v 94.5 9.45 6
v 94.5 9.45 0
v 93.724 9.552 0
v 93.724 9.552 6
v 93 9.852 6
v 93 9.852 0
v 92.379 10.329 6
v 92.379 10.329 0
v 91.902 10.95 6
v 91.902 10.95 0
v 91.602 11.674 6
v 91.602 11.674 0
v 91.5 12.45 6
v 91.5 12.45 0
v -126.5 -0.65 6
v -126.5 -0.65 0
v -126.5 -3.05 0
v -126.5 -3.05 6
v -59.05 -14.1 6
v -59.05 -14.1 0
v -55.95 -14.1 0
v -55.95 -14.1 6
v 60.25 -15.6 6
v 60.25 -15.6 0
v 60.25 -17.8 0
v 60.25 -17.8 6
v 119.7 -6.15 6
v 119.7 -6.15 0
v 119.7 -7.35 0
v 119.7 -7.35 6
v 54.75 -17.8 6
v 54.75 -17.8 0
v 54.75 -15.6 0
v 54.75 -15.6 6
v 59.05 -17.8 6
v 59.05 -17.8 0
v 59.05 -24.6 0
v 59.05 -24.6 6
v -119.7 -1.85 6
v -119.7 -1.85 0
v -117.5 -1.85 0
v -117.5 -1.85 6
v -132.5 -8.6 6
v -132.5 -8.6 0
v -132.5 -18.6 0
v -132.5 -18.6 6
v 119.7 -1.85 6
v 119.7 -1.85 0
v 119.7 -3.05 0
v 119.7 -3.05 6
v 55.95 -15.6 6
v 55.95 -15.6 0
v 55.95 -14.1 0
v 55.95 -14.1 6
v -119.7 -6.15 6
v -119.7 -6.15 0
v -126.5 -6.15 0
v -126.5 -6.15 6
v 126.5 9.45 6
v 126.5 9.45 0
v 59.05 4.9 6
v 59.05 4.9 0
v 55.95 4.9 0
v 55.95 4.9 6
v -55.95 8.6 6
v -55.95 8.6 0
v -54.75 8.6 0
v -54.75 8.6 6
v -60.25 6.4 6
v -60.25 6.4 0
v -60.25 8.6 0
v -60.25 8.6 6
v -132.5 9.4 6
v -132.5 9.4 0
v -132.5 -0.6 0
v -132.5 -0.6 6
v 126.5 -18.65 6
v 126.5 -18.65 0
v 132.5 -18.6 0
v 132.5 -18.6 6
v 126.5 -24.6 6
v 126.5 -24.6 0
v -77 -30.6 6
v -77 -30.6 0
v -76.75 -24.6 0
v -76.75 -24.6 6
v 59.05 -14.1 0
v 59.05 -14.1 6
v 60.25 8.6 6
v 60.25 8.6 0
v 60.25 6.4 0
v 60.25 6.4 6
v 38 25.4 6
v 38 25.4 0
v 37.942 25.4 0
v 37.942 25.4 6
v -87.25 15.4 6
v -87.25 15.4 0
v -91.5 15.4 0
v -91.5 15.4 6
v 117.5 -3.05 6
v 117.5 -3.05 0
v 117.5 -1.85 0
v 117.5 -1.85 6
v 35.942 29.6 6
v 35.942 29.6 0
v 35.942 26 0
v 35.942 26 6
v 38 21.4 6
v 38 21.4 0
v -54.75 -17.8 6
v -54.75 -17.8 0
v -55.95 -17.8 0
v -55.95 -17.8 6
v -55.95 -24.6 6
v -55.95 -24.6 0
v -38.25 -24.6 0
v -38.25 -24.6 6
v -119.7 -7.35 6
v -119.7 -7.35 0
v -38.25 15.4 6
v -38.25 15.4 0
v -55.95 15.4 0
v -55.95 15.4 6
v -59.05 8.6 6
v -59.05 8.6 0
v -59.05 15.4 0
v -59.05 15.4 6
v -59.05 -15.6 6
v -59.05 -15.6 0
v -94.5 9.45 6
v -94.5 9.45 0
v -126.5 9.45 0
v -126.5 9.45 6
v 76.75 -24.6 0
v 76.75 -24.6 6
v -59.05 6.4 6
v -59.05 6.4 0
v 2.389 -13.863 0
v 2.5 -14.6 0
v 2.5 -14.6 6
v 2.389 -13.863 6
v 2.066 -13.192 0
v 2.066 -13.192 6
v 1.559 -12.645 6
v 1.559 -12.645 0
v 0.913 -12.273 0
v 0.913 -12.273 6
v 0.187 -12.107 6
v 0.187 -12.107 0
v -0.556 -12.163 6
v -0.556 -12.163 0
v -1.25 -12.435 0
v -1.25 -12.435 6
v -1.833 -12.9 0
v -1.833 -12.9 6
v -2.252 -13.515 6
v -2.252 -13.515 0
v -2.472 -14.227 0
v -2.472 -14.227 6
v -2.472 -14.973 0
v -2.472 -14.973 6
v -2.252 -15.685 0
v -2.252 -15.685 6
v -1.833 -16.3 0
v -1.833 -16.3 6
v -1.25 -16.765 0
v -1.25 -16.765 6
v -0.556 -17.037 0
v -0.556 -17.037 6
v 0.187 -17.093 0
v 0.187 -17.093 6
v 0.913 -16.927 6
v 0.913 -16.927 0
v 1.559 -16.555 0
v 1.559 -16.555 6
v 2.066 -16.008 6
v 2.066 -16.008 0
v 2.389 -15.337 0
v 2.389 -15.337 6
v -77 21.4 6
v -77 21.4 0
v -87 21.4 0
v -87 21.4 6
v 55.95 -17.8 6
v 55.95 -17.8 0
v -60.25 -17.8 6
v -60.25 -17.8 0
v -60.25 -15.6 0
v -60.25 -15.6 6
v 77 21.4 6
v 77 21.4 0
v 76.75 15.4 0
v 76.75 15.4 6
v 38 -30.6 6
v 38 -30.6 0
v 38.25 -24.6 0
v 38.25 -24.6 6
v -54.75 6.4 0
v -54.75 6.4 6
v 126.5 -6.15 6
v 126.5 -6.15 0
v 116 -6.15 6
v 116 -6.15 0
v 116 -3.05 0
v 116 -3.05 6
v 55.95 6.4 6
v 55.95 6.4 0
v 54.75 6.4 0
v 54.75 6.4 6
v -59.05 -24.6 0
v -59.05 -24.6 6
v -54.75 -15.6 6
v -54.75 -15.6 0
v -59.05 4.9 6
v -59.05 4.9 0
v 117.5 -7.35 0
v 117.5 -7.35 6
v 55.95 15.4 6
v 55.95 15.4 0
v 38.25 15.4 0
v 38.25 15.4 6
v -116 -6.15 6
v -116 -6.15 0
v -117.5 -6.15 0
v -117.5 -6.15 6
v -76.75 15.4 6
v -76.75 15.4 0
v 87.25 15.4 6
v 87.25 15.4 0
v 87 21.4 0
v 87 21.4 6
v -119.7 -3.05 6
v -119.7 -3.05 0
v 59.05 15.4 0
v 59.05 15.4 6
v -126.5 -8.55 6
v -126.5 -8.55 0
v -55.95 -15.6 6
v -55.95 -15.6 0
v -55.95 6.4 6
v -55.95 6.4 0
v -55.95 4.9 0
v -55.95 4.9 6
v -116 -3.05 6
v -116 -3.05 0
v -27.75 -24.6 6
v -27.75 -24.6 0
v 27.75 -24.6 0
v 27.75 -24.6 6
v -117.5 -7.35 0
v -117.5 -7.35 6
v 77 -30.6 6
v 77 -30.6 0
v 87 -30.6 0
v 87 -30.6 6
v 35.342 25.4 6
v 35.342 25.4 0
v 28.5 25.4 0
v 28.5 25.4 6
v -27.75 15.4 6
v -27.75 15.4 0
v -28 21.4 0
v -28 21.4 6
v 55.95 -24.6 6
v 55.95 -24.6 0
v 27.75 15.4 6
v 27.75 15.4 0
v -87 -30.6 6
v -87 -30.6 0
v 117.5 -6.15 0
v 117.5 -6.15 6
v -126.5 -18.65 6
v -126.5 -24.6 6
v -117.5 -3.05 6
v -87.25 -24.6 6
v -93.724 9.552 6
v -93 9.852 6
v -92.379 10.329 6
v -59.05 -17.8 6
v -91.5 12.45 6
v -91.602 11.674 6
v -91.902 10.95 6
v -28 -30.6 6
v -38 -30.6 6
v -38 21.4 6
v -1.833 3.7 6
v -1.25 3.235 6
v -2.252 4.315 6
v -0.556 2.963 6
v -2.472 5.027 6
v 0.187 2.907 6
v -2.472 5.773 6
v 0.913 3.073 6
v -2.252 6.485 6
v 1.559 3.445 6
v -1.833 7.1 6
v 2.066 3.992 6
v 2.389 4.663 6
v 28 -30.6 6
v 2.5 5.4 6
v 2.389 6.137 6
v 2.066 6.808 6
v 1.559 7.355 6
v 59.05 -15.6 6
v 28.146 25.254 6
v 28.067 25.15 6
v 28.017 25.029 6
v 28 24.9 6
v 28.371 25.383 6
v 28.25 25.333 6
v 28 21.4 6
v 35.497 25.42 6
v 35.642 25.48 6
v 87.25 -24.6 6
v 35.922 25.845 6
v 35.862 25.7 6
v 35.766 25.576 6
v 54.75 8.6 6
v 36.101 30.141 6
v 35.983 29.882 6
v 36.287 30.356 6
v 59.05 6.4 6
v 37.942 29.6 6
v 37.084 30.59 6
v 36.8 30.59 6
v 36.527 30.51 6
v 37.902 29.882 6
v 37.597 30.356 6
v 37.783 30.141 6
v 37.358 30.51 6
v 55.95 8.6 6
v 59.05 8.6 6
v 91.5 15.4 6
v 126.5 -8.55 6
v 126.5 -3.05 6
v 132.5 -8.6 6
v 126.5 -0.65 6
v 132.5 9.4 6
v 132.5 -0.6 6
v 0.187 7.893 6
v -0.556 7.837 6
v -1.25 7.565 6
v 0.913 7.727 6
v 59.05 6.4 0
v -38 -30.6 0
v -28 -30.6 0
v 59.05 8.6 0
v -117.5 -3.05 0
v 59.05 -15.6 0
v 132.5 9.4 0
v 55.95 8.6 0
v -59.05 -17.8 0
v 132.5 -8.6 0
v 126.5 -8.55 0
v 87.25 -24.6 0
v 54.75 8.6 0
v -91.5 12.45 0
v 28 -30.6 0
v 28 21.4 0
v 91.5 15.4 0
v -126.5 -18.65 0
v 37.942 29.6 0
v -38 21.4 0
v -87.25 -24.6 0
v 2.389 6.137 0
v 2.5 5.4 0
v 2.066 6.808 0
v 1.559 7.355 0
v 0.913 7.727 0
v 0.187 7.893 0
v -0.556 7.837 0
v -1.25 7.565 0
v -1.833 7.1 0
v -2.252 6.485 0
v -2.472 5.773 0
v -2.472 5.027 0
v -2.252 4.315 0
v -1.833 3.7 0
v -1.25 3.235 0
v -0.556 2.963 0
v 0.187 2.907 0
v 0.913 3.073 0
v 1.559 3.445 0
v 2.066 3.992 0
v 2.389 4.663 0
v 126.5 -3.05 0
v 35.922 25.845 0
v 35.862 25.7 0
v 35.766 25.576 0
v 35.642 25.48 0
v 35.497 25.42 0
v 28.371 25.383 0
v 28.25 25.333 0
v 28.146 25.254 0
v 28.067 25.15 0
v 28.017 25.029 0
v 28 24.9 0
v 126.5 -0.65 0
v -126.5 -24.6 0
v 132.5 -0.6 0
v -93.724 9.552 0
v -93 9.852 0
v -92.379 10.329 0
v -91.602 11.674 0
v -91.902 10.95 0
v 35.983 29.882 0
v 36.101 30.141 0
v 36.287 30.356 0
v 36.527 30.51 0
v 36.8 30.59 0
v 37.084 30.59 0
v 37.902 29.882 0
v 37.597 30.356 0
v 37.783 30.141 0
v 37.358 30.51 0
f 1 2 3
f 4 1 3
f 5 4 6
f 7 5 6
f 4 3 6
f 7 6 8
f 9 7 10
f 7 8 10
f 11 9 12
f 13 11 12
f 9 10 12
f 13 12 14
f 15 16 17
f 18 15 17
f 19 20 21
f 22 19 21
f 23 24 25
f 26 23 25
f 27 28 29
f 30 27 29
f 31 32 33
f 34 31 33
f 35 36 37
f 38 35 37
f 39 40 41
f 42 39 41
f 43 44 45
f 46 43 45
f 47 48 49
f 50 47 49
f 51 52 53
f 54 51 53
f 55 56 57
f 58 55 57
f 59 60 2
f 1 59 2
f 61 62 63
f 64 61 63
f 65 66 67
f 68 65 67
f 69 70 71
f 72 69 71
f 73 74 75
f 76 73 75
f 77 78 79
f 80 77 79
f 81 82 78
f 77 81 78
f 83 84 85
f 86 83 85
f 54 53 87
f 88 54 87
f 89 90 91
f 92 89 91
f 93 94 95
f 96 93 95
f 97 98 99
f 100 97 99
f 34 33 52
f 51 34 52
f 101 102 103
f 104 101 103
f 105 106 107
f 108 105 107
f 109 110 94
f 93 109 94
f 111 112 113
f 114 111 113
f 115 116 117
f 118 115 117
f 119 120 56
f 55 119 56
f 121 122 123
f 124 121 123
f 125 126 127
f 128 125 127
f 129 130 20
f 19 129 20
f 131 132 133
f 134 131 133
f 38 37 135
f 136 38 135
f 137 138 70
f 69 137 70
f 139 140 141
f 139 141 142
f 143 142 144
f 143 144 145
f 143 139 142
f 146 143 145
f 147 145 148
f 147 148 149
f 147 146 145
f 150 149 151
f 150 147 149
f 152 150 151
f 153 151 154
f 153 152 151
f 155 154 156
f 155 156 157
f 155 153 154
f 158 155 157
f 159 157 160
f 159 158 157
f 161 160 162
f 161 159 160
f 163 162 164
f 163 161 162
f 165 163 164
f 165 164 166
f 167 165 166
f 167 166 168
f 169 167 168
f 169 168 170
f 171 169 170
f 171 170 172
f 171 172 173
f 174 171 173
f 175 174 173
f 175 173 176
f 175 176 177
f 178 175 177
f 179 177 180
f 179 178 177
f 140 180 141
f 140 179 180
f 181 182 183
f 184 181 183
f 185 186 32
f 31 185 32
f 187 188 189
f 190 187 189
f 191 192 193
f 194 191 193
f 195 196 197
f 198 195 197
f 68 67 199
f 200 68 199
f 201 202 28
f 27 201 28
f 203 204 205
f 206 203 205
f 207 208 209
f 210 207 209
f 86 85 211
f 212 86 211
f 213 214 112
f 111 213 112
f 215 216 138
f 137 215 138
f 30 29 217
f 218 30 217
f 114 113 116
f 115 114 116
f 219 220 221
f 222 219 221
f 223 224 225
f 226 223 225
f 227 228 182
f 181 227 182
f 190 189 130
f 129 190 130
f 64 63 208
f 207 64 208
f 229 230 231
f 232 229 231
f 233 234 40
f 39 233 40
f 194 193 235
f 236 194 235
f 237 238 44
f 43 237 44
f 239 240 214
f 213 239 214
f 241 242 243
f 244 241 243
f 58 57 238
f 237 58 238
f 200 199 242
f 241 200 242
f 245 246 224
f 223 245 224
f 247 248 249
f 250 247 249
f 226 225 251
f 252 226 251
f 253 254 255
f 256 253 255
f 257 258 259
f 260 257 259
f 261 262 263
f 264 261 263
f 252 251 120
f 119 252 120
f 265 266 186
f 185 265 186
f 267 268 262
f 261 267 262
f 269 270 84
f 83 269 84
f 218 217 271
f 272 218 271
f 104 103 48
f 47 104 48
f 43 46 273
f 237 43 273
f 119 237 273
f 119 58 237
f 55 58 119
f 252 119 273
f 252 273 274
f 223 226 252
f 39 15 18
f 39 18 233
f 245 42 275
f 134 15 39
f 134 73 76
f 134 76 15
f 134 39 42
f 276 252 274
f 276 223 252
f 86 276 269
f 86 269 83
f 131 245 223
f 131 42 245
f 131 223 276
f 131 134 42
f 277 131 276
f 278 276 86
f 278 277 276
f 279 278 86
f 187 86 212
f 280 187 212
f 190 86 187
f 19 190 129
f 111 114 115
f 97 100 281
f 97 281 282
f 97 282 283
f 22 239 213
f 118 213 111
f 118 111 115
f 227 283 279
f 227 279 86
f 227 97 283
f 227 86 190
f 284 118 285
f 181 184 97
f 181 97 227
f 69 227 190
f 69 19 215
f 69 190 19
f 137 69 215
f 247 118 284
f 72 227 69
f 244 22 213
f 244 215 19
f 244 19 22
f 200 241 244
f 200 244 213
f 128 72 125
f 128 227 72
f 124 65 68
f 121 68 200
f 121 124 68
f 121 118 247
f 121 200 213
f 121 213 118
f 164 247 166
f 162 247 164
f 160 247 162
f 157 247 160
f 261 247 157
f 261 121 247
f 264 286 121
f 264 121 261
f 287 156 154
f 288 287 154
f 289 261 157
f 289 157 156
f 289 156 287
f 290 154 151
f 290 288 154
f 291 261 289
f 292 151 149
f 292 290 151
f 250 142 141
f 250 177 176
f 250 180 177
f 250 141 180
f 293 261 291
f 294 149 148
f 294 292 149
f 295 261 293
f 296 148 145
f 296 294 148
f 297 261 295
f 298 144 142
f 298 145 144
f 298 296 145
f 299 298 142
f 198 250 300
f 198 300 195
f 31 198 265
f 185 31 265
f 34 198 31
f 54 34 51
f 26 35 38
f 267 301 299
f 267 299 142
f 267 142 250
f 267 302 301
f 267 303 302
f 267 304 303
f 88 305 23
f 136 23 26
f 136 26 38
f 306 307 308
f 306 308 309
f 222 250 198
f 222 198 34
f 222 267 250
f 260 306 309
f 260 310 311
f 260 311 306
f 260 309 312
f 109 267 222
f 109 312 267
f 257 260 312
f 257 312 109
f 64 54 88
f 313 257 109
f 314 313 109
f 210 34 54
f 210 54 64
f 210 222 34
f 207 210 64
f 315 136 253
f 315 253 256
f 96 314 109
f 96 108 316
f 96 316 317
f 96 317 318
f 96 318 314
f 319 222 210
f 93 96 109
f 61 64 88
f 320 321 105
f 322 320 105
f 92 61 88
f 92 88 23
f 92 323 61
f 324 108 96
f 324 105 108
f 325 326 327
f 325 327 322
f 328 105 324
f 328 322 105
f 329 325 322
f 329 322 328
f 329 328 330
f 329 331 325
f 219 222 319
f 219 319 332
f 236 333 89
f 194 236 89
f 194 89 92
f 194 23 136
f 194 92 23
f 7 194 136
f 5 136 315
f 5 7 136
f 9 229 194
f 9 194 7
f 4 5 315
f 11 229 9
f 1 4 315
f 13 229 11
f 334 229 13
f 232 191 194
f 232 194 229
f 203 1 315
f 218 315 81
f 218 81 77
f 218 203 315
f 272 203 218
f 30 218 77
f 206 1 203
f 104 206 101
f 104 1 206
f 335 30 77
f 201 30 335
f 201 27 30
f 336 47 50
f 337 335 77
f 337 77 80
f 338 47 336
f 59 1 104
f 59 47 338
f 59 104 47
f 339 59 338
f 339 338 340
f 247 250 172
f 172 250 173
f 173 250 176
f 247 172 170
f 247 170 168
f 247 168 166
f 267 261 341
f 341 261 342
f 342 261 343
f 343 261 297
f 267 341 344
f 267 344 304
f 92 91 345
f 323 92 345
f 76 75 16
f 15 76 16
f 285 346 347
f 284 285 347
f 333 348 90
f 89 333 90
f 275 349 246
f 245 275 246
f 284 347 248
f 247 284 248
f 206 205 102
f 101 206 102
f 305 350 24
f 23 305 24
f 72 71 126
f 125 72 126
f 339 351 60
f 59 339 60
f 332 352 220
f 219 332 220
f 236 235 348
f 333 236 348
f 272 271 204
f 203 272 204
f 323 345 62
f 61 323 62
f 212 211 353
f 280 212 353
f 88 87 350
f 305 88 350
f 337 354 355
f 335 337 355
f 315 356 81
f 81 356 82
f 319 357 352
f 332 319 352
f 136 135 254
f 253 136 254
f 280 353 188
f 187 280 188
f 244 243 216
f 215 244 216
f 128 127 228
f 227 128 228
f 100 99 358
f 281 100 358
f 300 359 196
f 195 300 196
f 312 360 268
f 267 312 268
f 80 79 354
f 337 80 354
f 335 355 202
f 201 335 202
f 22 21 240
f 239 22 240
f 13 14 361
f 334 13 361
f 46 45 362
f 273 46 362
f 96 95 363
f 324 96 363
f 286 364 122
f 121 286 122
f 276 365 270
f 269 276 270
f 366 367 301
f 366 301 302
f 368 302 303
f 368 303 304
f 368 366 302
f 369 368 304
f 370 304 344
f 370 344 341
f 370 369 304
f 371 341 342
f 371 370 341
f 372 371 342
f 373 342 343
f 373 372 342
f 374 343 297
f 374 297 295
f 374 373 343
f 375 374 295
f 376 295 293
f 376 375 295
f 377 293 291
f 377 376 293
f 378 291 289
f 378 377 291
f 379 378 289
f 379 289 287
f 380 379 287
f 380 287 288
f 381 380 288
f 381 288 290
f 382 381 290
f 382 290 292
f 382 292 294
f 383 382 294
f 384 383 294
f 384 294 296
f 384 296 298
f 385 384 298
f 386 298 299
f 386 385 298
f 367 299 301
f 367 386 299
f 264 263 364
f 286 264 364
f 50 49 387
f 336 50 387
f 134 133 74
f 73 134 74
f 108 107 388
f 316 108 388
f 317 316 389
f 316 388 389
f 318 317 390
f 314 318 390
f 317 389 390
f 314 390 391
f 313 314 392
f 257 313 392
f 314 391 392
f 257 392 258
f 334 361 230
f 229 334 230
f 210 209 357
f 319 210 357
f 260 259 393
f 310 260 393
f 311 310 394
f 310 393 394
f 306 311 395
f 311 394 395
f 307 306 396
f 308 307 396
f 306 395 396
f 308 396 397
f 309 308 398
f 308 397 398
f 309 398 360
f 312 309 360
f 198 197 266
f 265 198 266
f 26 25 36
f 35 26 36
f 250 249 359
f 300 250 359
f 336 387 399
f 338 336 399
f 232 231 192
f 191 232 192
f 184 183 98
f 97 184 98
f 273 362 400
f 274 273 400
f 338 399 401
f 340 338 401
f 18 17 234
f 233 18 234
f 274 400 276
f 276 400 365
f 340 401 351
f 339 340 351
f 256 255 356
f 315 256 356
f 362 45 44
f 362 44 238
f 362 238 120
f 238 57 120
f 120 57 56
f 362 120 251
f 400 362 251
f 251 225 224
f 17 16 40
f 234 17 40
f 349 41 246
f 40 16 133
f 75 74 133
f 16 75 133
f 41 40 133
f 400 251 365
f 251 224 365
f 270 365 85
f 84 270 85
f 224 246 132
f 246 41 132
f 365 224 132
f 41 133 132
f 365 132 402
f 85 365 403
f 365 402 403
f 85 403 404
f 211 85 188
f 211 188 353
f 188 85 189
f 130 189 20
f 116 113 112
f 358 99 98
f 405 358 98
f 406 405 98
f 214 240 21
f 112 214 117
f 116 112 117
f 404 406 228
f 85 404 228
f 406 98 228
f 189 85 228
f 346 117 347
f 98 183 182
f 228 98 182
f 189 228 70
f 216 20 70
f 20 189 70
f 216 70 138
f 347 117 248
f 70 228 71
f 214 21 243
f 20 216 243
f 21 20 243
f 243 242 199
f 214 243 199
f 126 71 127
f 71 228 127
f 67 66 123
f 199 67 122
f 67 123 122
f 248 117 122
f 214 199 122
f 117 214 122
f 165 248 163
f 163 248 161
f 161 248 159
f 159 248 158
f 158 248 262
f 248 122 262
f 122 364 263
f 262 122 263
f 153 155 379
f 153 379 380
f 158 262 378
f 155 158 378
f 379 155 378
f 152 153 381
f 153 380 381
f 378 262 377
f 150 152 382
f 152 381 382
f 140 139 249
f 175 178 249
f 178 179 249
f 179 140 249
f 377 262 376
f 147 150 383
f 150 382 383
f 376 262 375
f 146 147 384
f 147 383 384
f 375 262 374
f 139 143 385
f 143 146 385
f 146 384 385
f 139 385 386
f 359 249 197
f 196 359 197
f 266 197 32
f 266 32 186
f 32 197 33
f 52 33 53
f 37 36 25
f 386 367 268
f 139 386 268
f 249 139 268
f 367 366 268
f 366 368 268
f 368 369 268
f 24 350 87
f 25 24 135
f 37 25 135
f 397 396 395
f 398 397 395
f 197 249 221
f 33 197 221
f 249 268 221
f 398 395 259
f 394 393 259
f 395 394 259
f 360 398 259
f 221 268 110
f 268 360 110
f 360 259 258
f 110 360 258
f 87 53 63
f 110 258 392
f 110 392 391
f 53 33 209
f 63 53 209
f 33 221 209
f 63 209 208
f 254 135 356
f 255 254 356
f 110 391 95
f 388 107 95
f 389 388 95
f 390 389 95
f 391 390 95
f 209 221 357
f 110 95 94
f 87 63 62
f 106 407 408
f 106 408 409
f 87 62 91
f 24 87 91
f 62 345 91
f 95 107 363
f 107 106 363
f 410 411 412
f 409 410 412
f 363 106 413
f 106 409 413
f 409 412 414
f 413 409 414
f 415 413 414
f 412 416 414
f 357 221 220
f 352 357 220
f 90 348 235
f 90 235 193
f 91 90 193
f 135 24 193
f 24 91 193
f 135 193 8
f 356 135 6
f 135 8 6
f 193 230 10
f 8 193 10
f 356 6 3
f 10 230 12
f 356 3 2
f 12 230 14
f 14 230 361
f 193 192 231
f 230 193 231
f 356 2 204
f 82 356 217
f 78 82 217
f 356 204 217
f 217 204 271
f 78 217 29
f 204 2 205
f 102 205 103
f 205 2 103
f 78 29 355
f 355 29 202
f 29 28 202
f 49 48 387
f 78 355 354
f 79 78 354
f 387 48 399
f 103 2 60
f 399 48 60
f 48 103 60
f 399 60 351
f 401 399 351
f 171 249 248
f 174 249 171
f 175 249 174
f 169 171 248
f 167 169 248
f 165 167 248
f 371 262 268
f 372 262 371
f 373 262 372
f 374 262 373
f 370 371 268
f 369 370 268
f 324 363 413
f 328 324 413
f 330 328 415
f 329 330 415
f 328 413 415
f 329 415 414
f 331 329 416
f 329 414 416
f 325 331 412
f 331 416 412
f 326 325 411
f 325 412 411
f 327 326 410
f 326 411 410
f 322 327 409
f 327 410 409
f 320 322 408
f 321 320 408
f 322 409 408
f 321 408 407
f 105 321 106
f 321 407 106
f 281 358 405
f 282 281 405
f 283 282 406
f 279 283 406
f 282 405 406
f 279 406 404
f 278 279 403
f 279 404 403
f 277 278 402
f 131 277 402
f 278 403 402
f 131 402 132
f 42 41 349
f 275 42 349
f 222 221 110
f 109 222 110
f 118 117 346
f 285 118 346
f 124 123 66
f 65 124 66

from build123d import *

# Parameters (mm, degrees)
SKETCH_1_R      = 2.5
EXTRUDE_1_DEPTH = 6


with BuildPart() as part:
    # Эскиз1 → Бобышка-Вытянуть1 (new body)
    with BuildSketch(Plane.XY):
        with BuildLine():
            Line((-28, -30.6), (-27.75, -24.6))
            Line((-27.75, -24.6), (27.75, -24.6))
            Line((27.75, -24.6), (28, -30.6))
            Line((28, -30.6), (38, -30.6))
            Line((38, -30.6), (38.25, -24.6))
            Line((38.25, -24.6), (55.95, -24.6))
            Line((55.95, -24.6), (55.95, -17.8))
            Line((55.95, -17.8), (54.75, -17.8))
            Line((54.75, -17.8), (54.75, -15.6))
            Line((54.75, -15.6), (55.95, -15.6))
            Line((55.95, -15.6), (55.95, -14.1))
            Line((55.95, -14.1), (59.05, -14.1))
            Line((59.05, -14.1), (59.05, -15.6))
            Line((59.05, -15.6), (60.25, -15.6))
            Line((60.25, -15.6), (60.25, -17.8))
            Line((60.25, -17.8), (59.05, -17.8))
            Line((59.05, -17.8), (59.05, -24.6))
            Line((59.05, -24.6), (71.55, -24.6))
            Line((71.55, -24.6), (76.75, -24.6))
            Line((76.75, -24.6), (77, -30.6))
            Line((77, -30.6), (87, -30.6))
            Line((87, -30.6), (87.25, -24.6))
            Line((87.25, -24.6), (126.5, -24.6))
            Line((126.5, -24.6), (126.5, -18.65))
            Line((126.5, -18.65), (132.5, -18.6))
            Line((132.5, -18.6), (132.5, -8.6))
            Line((132.5, -8.6), (126.5, -8.55))
            Line((126.5, -8.55), (126.5, -6.15))
            Line((126.5, -6.15), (119.7, -6.15))
            Line((119.7, -6.15), (119.7, -7.35))
            Line((119.7, -7.35), (117.5, -7.35))
            Line((117.5, -7.35), (117.5, -6.15))
            Line((117.5, -6.15), (116, -6.15))
            Line((116, -6.15), (116, -3.05))
            Line((116, -3.05), (117.5, -3.05))
            Line((117.5, -3.05), (117.5, -1.85))
            Line((117.5, -1.85), (119.7, -1.85))
            Line((119.7, -1.85), (119.7, -3.05))
            Line((119.7, -3.05), (126.5, -3.05))
            Line((126.5, -3.05), (126.5, -0.65))
            Line((126.5, -0.65), (132.5, -0.6))
            Line((132.5, -0.6), (132.5, 9.4))
            Line((132.5, 9.4), (126.5, 9.45))
            Line((126.5, 9.45), (94.5, 9.45))
            ThreePointArc((94.5, 9.45), (92.378679656, 10.328679656), (91.5, 12.45))
            Line((91.5, 12.45), (91.5, 15.4))
            Line((91.5, 15.4), (87.25, 15.4))
            Line((87.25, 15.4), (87, 21.4))
            Line((87, 21.4), (77, 21.4))
            Line((77, 21.4), (76.75, 15.4))
            Line((76.75, 15.4), (59.05, 15.4))
            Line((59.05, 15.4), (59.05, 8.6))
            Line((59.05, 8.6), (60.25, 8.6))
            Line((60.25, 8.6), (60.25, 6.4))
            Line((60.25, 6.4), (59.05, 6.4))
            Line((59.05, 6.4), (59.05, 4.9))
            Line((59.05, 4.9), (55.95, 4.9))
            Line((55.95, 4.9), (55.95, 6.4))
            Line((55.95, 6.4), (54.75, 6.4))
            Line((54.75, 6.4), (54.75, 8.6))
            Line((54.75, 8.6), (55.95, 8.6))
            Line((55.95, 8.6), (55.95, 15.4))
            Line((55.95, 15.4), (38.25, 15.4))
            Line((38.25, 15.4), (38, 21.4))
            Line((38, 21.4), (38, 25.4))
            Line((38, 25.4), (37.942164229, 25.4))
            Line((37.942164229, 25.4), (37.942164229, 29.6))
            ThreePointArc((37.942164229, 29.6), (36.942164229, 30.6), (35.942164229, 29.6))
            Line((35.942164229, 29.6), (35.942164229, 26))
            ThreePointArc((35.942164229, 26), (35.766428298, 25.575735931), (35.342164229, 25.4))
            Line((35.342164229, 25.4), (28.5, 25.4))
            ThreePointArc((28.5, 25.4), (28.146446609, 25.253553391), (28, 24.9))
            Line((28, 24.9), (28, 21.4))
            Line((28, 21.4), (27.75, 15.4))
            Line((27.75, 15.4), (-27.75, 15.4))
            Line((-27.75, 15.4), (-28, 21.4))
            Line((-28, 21.4), (-38, 21.4))
            Line((-38, 21.4), (-38.25, 15.4))
            Line((-38.25, 15.4), (-43.45, 15.4))
            Line((-43.45, 15.4), (-55.95, 15.4))
            Line((-55.95, 15.4), (-55.95, 8.6))
            Line((-55.95, 8.6), (-54.75, 8.6))
            Line((-54.75, 8.6), (-54.75, 6.4))
            Line((-54.75, 6.4), (-55.95, 6.4))
            Line((-55.95, 6.4), (-55.95, 4.9))
            Line((-55.95, 4.9), (-59.05, 4.9))
            Line((-59.05, 4.9), (-59.05, 6.4))
            Line((-59.05, 6.4), (-60.25, 6.4))
            Line((-60.25, 6.4), (-60.25, 8.6))
            Line((-60.25, 8.6), (-59.05, 8.6))
            Line((-59.05, 8.6), (-59.05, 15.4))
            Line((-59.05, 15.4), (-64.25, 15.4))
            Line((-64.25, 15.4), (-76.75, 15.4))
            Line((-76.75, 15.4), (-77, 21.4))
            Line((-77, 21.4), (-87, 21.4))
            Line((-87, 21.4), (-87.25, 15.4))
            Line((-87.25, 15.4), (-91.5, 15.4))
            Line((-91.5, 15.4), (-91.5, 12.45))
            ThreePointArc((-91.5, 12.45), (-92.378679656, 10.328679656), (-94.5, 9.45))
            Line((-94.5, 9.45), (-126.5, 9.45))
            Line((-126.5, 9.45), (-132.5, 9.4))
            Line((-132.5, 9.4), (-132.5, -0.6))
            Line((-132.5, -0.6), (-126.5, -0.65))
            Line((-126.5, -0.65), (-126.5, -3.05))
            Line((-126.5, -3.05), (-119.7, -3.05))
            Line((-119.7, -3.05), (-119.7, -1.85))
            Line((-119.7, -1.85), (-117.5, -1.85))
            Line((-117.5, -1.85), (-117.5, -3.05))
            Line((-117.5, -3.05), (-116, -3.05))
            Line((-116, -3.05), (-116, -6.15))
            Line((-116, -6.15), (-117.5, -6.15))
            Line((-117.5, -6.15), (-117.5, -7.35))
            Line((-117.5, -7.35), (-119.7, -7.35))
            Line((-119.7, -7.35), (-119.7, -6.15))
            Line((-119.7, -6.15), (-126.5, -6.15))
            Line((-126.5, -6.15), (-126.5, -8.55))
            Line((-126.5, -8.55), (-132.5, -8.6))
            Line((-132.5, -8.6), (-132.5, -18.6))
            Line((-132.5, -18.6), (-126.5, -18.65))
            Line((-126.5, -18.65), (-126.5, -24.6))
            Line((-126.5, -24.6), (-87.25, -24.6))
            Line((-87.25, -24.6), (-87, -30.6))
            Line((-87, -30.6), (-77, -30.6))
            Line((-77, -30.6), (-76.75, -24.6))
            Line((-76.75, -24.6), (-64.25, -24.6))
            Line((-64.25, -24.6), (-59.05, -24.6))
            Line((-59.05, -24.6), (-59.05, -17.8))
            Line((-59.05, -17.8), (-60.25, -17.8))
            Line((-60.25, -17.8), (-60.25, -15.6))
            Line((-60.25, -15.6), (-59.05, -15.6))
            Line((-59.05, -15.6), (-59.05, -14.1))
            Line((-59.05, -14.1), (-55.95, -14.1))
            Line((-55.95, -14.1), (-55.95, -15.6))
            Line((-55.95, -15.6), (-54.75, -15.6))
            Line((-54.75, -15.6), (-54.75, -17.8))
            Line((-54.75, -17.8), (-55.95, -17.8))
            Line((-55.95, -17.8), (-55.95, -24.6))
            Line((-55.95, -24.6), (-43.45, -24.6))
            Line((-43.45, -24.6), (-38.25, -24.6))
            Line((-38.25, -24.6), (-38, -30.6))
            Line((-38, -30.6), (-28, -30.6))
        make_face()
        with Locations((0, -14.6)):
            Circle(SKETCH_1_R, mode=Mode.SUBTRACT)
        with Locations((0, 5.4)):
            Circle(SKETCH_1_R, mode=Mode.SUBTRACT)
    extrude(amount=EXTRUDE_1_DEPTH)


solid = part.part
